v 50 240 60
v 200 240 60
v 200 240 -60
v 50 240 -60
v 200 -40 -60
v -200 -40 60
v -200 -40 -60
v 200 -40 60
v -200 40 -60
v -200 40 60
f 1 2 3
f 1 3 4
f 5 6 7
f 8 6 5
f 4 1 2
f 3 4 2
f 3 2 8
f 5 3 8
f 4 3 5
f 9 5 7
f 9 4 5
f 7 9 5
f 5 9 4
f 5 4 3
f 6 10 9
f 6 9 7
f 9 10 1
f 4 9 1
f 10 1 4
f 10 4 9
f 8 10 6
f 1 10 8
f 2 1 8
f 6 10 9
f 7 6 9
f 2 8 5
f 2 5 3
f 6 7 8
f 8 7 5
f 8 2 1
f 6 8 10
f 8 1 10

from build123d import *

# Parameters (mm, degrees)
SKETCH1_W           = 400
SKETCH1_H           = 120
BOSS_EXTRUDE1_DEPTH = 40
BOSS_EXTRUDE2_DEPTH = 120
BOSS_EXTRUDE3_DEPTH = 120


with BuildPart() as part:
    # Sketch1 → Boss-Extrude1 (new body, symmetric)
    with BuildSketch(Plane(origin=(0, 0, 0), x_dir=(1, 0, 0), z_dir=(0, 1, 0))):
        Rectangle(SKETCH1_W, SKETCH1_H)
    extrude(amount=BOSS_EXTRUDE1_DEPTH, both=True)

    # Sketch3 → Boss-Extrude2 (add)
    with BuildSketch(Plane.XY.offset(60)):
        Polygon((-200, 40), (50, 240), (200, 240), (200, 40), align=None)
    extrude(amount=-BOSS_EXTRUDE2_DEPTH)


with BuildPart() as body_2:
    # Sketch4 → Boss-Extrude3 (new body)
    with BuildSketch(Plane.XY.offset(60)):
        Polygon((-200, -40), (200, -40), (200, 240), (50, 240), (-200, 40), align=None)
    extrude(amount=-BOSS_EXTRUDE3_DEPTH)


solid = Compound([part.part, body_2.part])
